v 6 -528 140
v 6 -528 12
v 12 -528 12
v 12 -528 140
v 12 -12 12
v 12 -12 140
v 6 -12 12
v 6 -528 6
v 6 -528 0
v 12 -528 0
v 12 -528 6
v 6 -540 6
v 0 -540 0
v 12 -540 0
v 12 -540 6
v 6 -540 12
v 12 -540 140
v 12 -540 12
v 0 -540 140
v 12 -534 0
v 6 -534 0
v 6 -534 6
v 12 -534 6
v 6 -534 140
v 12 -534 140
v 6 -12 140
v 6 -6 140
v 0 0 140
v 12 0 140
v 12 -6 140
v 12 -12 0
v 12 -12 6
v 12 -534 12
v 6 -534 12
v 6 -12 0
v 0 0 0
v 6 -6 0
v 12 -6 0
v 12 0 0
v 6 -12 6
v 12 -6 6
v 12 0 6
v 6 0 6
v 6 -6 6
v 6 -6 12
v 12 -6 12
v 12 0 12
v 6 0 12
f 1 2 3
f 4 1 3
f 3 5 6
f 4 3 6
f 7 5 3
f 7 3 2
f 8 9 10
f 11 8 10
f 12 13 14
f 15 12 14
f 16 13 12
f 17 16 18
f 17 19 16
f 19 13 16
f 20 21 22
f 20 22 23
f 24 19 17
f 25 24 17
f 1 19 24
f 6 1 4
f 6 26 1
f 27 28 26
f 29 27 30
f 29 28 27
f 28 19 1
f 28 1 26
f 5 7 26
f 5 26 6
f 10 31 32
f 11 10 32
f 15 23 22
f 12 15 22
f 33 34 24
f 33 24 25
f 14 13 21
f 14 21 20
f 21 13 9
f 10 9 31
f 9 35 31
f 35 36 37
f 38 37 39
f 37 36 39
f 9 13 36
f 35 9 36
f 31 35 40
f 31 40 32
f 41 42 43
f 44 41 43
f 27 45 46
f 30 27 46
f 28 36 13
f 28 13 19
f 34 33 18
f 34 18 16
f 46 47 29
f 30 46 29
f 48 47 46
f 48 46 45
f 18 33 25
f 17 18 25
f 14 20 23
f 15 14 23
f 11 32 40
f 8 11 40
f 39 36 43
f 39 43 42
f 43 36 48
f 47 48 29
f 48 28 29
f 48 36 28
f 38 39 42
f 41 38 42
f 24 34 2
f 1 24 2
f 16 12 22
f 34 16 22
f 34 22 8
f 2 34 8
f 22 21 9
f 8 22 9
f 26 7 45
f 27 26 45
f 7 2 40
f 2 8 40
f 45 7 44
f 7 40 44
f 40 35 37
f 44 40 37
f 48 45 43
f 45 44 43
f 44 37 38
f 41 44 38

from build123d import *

# Parameters (mm, degrees)
F0_W     = 12
F0_H     = 140
F1_DEPTH = 540
F2_W     = 6
F2_H     = 6
F3_DEPTH = 140.001
F4_W     = 6
F4_H     = 6
F5_DEPTH = 540.001


with BuildPart() as f1:
    # F0 (on Front) → F1 (new body)
    with BuildSketch(Plane.XZ):
        with Locations((6, 70)):
            Rectangle(F0_W, F0_H)
    extrude(amount=F1_DEPTH)

    # F2 (on Top) → F3 (cut, through all)
    with BuildSketch(Plane.XY):
        with Locations((9, -9)):
            Rectangle(F2_W, F2_H)
        with Locations((9, -531)):
            Rectangle(F2_W, F2_H)
    extrude(amount=F3_DEPTH, mode=Mode.SUBTRACT)

    # F4 (on face) → F5 (cut, through all)
    with BuildSketch(Plane(origin=(0, 0, 0), x_dir=(-1, 0, 0), z_dir=(0, 1, 0))):
        with Locations((-9, 9)):
            Rectangle(F4_W, F4_H)
    extrude(amount=-F5_DEPTH, mode=Mode.SUBTRACT)


solid = f1.part
